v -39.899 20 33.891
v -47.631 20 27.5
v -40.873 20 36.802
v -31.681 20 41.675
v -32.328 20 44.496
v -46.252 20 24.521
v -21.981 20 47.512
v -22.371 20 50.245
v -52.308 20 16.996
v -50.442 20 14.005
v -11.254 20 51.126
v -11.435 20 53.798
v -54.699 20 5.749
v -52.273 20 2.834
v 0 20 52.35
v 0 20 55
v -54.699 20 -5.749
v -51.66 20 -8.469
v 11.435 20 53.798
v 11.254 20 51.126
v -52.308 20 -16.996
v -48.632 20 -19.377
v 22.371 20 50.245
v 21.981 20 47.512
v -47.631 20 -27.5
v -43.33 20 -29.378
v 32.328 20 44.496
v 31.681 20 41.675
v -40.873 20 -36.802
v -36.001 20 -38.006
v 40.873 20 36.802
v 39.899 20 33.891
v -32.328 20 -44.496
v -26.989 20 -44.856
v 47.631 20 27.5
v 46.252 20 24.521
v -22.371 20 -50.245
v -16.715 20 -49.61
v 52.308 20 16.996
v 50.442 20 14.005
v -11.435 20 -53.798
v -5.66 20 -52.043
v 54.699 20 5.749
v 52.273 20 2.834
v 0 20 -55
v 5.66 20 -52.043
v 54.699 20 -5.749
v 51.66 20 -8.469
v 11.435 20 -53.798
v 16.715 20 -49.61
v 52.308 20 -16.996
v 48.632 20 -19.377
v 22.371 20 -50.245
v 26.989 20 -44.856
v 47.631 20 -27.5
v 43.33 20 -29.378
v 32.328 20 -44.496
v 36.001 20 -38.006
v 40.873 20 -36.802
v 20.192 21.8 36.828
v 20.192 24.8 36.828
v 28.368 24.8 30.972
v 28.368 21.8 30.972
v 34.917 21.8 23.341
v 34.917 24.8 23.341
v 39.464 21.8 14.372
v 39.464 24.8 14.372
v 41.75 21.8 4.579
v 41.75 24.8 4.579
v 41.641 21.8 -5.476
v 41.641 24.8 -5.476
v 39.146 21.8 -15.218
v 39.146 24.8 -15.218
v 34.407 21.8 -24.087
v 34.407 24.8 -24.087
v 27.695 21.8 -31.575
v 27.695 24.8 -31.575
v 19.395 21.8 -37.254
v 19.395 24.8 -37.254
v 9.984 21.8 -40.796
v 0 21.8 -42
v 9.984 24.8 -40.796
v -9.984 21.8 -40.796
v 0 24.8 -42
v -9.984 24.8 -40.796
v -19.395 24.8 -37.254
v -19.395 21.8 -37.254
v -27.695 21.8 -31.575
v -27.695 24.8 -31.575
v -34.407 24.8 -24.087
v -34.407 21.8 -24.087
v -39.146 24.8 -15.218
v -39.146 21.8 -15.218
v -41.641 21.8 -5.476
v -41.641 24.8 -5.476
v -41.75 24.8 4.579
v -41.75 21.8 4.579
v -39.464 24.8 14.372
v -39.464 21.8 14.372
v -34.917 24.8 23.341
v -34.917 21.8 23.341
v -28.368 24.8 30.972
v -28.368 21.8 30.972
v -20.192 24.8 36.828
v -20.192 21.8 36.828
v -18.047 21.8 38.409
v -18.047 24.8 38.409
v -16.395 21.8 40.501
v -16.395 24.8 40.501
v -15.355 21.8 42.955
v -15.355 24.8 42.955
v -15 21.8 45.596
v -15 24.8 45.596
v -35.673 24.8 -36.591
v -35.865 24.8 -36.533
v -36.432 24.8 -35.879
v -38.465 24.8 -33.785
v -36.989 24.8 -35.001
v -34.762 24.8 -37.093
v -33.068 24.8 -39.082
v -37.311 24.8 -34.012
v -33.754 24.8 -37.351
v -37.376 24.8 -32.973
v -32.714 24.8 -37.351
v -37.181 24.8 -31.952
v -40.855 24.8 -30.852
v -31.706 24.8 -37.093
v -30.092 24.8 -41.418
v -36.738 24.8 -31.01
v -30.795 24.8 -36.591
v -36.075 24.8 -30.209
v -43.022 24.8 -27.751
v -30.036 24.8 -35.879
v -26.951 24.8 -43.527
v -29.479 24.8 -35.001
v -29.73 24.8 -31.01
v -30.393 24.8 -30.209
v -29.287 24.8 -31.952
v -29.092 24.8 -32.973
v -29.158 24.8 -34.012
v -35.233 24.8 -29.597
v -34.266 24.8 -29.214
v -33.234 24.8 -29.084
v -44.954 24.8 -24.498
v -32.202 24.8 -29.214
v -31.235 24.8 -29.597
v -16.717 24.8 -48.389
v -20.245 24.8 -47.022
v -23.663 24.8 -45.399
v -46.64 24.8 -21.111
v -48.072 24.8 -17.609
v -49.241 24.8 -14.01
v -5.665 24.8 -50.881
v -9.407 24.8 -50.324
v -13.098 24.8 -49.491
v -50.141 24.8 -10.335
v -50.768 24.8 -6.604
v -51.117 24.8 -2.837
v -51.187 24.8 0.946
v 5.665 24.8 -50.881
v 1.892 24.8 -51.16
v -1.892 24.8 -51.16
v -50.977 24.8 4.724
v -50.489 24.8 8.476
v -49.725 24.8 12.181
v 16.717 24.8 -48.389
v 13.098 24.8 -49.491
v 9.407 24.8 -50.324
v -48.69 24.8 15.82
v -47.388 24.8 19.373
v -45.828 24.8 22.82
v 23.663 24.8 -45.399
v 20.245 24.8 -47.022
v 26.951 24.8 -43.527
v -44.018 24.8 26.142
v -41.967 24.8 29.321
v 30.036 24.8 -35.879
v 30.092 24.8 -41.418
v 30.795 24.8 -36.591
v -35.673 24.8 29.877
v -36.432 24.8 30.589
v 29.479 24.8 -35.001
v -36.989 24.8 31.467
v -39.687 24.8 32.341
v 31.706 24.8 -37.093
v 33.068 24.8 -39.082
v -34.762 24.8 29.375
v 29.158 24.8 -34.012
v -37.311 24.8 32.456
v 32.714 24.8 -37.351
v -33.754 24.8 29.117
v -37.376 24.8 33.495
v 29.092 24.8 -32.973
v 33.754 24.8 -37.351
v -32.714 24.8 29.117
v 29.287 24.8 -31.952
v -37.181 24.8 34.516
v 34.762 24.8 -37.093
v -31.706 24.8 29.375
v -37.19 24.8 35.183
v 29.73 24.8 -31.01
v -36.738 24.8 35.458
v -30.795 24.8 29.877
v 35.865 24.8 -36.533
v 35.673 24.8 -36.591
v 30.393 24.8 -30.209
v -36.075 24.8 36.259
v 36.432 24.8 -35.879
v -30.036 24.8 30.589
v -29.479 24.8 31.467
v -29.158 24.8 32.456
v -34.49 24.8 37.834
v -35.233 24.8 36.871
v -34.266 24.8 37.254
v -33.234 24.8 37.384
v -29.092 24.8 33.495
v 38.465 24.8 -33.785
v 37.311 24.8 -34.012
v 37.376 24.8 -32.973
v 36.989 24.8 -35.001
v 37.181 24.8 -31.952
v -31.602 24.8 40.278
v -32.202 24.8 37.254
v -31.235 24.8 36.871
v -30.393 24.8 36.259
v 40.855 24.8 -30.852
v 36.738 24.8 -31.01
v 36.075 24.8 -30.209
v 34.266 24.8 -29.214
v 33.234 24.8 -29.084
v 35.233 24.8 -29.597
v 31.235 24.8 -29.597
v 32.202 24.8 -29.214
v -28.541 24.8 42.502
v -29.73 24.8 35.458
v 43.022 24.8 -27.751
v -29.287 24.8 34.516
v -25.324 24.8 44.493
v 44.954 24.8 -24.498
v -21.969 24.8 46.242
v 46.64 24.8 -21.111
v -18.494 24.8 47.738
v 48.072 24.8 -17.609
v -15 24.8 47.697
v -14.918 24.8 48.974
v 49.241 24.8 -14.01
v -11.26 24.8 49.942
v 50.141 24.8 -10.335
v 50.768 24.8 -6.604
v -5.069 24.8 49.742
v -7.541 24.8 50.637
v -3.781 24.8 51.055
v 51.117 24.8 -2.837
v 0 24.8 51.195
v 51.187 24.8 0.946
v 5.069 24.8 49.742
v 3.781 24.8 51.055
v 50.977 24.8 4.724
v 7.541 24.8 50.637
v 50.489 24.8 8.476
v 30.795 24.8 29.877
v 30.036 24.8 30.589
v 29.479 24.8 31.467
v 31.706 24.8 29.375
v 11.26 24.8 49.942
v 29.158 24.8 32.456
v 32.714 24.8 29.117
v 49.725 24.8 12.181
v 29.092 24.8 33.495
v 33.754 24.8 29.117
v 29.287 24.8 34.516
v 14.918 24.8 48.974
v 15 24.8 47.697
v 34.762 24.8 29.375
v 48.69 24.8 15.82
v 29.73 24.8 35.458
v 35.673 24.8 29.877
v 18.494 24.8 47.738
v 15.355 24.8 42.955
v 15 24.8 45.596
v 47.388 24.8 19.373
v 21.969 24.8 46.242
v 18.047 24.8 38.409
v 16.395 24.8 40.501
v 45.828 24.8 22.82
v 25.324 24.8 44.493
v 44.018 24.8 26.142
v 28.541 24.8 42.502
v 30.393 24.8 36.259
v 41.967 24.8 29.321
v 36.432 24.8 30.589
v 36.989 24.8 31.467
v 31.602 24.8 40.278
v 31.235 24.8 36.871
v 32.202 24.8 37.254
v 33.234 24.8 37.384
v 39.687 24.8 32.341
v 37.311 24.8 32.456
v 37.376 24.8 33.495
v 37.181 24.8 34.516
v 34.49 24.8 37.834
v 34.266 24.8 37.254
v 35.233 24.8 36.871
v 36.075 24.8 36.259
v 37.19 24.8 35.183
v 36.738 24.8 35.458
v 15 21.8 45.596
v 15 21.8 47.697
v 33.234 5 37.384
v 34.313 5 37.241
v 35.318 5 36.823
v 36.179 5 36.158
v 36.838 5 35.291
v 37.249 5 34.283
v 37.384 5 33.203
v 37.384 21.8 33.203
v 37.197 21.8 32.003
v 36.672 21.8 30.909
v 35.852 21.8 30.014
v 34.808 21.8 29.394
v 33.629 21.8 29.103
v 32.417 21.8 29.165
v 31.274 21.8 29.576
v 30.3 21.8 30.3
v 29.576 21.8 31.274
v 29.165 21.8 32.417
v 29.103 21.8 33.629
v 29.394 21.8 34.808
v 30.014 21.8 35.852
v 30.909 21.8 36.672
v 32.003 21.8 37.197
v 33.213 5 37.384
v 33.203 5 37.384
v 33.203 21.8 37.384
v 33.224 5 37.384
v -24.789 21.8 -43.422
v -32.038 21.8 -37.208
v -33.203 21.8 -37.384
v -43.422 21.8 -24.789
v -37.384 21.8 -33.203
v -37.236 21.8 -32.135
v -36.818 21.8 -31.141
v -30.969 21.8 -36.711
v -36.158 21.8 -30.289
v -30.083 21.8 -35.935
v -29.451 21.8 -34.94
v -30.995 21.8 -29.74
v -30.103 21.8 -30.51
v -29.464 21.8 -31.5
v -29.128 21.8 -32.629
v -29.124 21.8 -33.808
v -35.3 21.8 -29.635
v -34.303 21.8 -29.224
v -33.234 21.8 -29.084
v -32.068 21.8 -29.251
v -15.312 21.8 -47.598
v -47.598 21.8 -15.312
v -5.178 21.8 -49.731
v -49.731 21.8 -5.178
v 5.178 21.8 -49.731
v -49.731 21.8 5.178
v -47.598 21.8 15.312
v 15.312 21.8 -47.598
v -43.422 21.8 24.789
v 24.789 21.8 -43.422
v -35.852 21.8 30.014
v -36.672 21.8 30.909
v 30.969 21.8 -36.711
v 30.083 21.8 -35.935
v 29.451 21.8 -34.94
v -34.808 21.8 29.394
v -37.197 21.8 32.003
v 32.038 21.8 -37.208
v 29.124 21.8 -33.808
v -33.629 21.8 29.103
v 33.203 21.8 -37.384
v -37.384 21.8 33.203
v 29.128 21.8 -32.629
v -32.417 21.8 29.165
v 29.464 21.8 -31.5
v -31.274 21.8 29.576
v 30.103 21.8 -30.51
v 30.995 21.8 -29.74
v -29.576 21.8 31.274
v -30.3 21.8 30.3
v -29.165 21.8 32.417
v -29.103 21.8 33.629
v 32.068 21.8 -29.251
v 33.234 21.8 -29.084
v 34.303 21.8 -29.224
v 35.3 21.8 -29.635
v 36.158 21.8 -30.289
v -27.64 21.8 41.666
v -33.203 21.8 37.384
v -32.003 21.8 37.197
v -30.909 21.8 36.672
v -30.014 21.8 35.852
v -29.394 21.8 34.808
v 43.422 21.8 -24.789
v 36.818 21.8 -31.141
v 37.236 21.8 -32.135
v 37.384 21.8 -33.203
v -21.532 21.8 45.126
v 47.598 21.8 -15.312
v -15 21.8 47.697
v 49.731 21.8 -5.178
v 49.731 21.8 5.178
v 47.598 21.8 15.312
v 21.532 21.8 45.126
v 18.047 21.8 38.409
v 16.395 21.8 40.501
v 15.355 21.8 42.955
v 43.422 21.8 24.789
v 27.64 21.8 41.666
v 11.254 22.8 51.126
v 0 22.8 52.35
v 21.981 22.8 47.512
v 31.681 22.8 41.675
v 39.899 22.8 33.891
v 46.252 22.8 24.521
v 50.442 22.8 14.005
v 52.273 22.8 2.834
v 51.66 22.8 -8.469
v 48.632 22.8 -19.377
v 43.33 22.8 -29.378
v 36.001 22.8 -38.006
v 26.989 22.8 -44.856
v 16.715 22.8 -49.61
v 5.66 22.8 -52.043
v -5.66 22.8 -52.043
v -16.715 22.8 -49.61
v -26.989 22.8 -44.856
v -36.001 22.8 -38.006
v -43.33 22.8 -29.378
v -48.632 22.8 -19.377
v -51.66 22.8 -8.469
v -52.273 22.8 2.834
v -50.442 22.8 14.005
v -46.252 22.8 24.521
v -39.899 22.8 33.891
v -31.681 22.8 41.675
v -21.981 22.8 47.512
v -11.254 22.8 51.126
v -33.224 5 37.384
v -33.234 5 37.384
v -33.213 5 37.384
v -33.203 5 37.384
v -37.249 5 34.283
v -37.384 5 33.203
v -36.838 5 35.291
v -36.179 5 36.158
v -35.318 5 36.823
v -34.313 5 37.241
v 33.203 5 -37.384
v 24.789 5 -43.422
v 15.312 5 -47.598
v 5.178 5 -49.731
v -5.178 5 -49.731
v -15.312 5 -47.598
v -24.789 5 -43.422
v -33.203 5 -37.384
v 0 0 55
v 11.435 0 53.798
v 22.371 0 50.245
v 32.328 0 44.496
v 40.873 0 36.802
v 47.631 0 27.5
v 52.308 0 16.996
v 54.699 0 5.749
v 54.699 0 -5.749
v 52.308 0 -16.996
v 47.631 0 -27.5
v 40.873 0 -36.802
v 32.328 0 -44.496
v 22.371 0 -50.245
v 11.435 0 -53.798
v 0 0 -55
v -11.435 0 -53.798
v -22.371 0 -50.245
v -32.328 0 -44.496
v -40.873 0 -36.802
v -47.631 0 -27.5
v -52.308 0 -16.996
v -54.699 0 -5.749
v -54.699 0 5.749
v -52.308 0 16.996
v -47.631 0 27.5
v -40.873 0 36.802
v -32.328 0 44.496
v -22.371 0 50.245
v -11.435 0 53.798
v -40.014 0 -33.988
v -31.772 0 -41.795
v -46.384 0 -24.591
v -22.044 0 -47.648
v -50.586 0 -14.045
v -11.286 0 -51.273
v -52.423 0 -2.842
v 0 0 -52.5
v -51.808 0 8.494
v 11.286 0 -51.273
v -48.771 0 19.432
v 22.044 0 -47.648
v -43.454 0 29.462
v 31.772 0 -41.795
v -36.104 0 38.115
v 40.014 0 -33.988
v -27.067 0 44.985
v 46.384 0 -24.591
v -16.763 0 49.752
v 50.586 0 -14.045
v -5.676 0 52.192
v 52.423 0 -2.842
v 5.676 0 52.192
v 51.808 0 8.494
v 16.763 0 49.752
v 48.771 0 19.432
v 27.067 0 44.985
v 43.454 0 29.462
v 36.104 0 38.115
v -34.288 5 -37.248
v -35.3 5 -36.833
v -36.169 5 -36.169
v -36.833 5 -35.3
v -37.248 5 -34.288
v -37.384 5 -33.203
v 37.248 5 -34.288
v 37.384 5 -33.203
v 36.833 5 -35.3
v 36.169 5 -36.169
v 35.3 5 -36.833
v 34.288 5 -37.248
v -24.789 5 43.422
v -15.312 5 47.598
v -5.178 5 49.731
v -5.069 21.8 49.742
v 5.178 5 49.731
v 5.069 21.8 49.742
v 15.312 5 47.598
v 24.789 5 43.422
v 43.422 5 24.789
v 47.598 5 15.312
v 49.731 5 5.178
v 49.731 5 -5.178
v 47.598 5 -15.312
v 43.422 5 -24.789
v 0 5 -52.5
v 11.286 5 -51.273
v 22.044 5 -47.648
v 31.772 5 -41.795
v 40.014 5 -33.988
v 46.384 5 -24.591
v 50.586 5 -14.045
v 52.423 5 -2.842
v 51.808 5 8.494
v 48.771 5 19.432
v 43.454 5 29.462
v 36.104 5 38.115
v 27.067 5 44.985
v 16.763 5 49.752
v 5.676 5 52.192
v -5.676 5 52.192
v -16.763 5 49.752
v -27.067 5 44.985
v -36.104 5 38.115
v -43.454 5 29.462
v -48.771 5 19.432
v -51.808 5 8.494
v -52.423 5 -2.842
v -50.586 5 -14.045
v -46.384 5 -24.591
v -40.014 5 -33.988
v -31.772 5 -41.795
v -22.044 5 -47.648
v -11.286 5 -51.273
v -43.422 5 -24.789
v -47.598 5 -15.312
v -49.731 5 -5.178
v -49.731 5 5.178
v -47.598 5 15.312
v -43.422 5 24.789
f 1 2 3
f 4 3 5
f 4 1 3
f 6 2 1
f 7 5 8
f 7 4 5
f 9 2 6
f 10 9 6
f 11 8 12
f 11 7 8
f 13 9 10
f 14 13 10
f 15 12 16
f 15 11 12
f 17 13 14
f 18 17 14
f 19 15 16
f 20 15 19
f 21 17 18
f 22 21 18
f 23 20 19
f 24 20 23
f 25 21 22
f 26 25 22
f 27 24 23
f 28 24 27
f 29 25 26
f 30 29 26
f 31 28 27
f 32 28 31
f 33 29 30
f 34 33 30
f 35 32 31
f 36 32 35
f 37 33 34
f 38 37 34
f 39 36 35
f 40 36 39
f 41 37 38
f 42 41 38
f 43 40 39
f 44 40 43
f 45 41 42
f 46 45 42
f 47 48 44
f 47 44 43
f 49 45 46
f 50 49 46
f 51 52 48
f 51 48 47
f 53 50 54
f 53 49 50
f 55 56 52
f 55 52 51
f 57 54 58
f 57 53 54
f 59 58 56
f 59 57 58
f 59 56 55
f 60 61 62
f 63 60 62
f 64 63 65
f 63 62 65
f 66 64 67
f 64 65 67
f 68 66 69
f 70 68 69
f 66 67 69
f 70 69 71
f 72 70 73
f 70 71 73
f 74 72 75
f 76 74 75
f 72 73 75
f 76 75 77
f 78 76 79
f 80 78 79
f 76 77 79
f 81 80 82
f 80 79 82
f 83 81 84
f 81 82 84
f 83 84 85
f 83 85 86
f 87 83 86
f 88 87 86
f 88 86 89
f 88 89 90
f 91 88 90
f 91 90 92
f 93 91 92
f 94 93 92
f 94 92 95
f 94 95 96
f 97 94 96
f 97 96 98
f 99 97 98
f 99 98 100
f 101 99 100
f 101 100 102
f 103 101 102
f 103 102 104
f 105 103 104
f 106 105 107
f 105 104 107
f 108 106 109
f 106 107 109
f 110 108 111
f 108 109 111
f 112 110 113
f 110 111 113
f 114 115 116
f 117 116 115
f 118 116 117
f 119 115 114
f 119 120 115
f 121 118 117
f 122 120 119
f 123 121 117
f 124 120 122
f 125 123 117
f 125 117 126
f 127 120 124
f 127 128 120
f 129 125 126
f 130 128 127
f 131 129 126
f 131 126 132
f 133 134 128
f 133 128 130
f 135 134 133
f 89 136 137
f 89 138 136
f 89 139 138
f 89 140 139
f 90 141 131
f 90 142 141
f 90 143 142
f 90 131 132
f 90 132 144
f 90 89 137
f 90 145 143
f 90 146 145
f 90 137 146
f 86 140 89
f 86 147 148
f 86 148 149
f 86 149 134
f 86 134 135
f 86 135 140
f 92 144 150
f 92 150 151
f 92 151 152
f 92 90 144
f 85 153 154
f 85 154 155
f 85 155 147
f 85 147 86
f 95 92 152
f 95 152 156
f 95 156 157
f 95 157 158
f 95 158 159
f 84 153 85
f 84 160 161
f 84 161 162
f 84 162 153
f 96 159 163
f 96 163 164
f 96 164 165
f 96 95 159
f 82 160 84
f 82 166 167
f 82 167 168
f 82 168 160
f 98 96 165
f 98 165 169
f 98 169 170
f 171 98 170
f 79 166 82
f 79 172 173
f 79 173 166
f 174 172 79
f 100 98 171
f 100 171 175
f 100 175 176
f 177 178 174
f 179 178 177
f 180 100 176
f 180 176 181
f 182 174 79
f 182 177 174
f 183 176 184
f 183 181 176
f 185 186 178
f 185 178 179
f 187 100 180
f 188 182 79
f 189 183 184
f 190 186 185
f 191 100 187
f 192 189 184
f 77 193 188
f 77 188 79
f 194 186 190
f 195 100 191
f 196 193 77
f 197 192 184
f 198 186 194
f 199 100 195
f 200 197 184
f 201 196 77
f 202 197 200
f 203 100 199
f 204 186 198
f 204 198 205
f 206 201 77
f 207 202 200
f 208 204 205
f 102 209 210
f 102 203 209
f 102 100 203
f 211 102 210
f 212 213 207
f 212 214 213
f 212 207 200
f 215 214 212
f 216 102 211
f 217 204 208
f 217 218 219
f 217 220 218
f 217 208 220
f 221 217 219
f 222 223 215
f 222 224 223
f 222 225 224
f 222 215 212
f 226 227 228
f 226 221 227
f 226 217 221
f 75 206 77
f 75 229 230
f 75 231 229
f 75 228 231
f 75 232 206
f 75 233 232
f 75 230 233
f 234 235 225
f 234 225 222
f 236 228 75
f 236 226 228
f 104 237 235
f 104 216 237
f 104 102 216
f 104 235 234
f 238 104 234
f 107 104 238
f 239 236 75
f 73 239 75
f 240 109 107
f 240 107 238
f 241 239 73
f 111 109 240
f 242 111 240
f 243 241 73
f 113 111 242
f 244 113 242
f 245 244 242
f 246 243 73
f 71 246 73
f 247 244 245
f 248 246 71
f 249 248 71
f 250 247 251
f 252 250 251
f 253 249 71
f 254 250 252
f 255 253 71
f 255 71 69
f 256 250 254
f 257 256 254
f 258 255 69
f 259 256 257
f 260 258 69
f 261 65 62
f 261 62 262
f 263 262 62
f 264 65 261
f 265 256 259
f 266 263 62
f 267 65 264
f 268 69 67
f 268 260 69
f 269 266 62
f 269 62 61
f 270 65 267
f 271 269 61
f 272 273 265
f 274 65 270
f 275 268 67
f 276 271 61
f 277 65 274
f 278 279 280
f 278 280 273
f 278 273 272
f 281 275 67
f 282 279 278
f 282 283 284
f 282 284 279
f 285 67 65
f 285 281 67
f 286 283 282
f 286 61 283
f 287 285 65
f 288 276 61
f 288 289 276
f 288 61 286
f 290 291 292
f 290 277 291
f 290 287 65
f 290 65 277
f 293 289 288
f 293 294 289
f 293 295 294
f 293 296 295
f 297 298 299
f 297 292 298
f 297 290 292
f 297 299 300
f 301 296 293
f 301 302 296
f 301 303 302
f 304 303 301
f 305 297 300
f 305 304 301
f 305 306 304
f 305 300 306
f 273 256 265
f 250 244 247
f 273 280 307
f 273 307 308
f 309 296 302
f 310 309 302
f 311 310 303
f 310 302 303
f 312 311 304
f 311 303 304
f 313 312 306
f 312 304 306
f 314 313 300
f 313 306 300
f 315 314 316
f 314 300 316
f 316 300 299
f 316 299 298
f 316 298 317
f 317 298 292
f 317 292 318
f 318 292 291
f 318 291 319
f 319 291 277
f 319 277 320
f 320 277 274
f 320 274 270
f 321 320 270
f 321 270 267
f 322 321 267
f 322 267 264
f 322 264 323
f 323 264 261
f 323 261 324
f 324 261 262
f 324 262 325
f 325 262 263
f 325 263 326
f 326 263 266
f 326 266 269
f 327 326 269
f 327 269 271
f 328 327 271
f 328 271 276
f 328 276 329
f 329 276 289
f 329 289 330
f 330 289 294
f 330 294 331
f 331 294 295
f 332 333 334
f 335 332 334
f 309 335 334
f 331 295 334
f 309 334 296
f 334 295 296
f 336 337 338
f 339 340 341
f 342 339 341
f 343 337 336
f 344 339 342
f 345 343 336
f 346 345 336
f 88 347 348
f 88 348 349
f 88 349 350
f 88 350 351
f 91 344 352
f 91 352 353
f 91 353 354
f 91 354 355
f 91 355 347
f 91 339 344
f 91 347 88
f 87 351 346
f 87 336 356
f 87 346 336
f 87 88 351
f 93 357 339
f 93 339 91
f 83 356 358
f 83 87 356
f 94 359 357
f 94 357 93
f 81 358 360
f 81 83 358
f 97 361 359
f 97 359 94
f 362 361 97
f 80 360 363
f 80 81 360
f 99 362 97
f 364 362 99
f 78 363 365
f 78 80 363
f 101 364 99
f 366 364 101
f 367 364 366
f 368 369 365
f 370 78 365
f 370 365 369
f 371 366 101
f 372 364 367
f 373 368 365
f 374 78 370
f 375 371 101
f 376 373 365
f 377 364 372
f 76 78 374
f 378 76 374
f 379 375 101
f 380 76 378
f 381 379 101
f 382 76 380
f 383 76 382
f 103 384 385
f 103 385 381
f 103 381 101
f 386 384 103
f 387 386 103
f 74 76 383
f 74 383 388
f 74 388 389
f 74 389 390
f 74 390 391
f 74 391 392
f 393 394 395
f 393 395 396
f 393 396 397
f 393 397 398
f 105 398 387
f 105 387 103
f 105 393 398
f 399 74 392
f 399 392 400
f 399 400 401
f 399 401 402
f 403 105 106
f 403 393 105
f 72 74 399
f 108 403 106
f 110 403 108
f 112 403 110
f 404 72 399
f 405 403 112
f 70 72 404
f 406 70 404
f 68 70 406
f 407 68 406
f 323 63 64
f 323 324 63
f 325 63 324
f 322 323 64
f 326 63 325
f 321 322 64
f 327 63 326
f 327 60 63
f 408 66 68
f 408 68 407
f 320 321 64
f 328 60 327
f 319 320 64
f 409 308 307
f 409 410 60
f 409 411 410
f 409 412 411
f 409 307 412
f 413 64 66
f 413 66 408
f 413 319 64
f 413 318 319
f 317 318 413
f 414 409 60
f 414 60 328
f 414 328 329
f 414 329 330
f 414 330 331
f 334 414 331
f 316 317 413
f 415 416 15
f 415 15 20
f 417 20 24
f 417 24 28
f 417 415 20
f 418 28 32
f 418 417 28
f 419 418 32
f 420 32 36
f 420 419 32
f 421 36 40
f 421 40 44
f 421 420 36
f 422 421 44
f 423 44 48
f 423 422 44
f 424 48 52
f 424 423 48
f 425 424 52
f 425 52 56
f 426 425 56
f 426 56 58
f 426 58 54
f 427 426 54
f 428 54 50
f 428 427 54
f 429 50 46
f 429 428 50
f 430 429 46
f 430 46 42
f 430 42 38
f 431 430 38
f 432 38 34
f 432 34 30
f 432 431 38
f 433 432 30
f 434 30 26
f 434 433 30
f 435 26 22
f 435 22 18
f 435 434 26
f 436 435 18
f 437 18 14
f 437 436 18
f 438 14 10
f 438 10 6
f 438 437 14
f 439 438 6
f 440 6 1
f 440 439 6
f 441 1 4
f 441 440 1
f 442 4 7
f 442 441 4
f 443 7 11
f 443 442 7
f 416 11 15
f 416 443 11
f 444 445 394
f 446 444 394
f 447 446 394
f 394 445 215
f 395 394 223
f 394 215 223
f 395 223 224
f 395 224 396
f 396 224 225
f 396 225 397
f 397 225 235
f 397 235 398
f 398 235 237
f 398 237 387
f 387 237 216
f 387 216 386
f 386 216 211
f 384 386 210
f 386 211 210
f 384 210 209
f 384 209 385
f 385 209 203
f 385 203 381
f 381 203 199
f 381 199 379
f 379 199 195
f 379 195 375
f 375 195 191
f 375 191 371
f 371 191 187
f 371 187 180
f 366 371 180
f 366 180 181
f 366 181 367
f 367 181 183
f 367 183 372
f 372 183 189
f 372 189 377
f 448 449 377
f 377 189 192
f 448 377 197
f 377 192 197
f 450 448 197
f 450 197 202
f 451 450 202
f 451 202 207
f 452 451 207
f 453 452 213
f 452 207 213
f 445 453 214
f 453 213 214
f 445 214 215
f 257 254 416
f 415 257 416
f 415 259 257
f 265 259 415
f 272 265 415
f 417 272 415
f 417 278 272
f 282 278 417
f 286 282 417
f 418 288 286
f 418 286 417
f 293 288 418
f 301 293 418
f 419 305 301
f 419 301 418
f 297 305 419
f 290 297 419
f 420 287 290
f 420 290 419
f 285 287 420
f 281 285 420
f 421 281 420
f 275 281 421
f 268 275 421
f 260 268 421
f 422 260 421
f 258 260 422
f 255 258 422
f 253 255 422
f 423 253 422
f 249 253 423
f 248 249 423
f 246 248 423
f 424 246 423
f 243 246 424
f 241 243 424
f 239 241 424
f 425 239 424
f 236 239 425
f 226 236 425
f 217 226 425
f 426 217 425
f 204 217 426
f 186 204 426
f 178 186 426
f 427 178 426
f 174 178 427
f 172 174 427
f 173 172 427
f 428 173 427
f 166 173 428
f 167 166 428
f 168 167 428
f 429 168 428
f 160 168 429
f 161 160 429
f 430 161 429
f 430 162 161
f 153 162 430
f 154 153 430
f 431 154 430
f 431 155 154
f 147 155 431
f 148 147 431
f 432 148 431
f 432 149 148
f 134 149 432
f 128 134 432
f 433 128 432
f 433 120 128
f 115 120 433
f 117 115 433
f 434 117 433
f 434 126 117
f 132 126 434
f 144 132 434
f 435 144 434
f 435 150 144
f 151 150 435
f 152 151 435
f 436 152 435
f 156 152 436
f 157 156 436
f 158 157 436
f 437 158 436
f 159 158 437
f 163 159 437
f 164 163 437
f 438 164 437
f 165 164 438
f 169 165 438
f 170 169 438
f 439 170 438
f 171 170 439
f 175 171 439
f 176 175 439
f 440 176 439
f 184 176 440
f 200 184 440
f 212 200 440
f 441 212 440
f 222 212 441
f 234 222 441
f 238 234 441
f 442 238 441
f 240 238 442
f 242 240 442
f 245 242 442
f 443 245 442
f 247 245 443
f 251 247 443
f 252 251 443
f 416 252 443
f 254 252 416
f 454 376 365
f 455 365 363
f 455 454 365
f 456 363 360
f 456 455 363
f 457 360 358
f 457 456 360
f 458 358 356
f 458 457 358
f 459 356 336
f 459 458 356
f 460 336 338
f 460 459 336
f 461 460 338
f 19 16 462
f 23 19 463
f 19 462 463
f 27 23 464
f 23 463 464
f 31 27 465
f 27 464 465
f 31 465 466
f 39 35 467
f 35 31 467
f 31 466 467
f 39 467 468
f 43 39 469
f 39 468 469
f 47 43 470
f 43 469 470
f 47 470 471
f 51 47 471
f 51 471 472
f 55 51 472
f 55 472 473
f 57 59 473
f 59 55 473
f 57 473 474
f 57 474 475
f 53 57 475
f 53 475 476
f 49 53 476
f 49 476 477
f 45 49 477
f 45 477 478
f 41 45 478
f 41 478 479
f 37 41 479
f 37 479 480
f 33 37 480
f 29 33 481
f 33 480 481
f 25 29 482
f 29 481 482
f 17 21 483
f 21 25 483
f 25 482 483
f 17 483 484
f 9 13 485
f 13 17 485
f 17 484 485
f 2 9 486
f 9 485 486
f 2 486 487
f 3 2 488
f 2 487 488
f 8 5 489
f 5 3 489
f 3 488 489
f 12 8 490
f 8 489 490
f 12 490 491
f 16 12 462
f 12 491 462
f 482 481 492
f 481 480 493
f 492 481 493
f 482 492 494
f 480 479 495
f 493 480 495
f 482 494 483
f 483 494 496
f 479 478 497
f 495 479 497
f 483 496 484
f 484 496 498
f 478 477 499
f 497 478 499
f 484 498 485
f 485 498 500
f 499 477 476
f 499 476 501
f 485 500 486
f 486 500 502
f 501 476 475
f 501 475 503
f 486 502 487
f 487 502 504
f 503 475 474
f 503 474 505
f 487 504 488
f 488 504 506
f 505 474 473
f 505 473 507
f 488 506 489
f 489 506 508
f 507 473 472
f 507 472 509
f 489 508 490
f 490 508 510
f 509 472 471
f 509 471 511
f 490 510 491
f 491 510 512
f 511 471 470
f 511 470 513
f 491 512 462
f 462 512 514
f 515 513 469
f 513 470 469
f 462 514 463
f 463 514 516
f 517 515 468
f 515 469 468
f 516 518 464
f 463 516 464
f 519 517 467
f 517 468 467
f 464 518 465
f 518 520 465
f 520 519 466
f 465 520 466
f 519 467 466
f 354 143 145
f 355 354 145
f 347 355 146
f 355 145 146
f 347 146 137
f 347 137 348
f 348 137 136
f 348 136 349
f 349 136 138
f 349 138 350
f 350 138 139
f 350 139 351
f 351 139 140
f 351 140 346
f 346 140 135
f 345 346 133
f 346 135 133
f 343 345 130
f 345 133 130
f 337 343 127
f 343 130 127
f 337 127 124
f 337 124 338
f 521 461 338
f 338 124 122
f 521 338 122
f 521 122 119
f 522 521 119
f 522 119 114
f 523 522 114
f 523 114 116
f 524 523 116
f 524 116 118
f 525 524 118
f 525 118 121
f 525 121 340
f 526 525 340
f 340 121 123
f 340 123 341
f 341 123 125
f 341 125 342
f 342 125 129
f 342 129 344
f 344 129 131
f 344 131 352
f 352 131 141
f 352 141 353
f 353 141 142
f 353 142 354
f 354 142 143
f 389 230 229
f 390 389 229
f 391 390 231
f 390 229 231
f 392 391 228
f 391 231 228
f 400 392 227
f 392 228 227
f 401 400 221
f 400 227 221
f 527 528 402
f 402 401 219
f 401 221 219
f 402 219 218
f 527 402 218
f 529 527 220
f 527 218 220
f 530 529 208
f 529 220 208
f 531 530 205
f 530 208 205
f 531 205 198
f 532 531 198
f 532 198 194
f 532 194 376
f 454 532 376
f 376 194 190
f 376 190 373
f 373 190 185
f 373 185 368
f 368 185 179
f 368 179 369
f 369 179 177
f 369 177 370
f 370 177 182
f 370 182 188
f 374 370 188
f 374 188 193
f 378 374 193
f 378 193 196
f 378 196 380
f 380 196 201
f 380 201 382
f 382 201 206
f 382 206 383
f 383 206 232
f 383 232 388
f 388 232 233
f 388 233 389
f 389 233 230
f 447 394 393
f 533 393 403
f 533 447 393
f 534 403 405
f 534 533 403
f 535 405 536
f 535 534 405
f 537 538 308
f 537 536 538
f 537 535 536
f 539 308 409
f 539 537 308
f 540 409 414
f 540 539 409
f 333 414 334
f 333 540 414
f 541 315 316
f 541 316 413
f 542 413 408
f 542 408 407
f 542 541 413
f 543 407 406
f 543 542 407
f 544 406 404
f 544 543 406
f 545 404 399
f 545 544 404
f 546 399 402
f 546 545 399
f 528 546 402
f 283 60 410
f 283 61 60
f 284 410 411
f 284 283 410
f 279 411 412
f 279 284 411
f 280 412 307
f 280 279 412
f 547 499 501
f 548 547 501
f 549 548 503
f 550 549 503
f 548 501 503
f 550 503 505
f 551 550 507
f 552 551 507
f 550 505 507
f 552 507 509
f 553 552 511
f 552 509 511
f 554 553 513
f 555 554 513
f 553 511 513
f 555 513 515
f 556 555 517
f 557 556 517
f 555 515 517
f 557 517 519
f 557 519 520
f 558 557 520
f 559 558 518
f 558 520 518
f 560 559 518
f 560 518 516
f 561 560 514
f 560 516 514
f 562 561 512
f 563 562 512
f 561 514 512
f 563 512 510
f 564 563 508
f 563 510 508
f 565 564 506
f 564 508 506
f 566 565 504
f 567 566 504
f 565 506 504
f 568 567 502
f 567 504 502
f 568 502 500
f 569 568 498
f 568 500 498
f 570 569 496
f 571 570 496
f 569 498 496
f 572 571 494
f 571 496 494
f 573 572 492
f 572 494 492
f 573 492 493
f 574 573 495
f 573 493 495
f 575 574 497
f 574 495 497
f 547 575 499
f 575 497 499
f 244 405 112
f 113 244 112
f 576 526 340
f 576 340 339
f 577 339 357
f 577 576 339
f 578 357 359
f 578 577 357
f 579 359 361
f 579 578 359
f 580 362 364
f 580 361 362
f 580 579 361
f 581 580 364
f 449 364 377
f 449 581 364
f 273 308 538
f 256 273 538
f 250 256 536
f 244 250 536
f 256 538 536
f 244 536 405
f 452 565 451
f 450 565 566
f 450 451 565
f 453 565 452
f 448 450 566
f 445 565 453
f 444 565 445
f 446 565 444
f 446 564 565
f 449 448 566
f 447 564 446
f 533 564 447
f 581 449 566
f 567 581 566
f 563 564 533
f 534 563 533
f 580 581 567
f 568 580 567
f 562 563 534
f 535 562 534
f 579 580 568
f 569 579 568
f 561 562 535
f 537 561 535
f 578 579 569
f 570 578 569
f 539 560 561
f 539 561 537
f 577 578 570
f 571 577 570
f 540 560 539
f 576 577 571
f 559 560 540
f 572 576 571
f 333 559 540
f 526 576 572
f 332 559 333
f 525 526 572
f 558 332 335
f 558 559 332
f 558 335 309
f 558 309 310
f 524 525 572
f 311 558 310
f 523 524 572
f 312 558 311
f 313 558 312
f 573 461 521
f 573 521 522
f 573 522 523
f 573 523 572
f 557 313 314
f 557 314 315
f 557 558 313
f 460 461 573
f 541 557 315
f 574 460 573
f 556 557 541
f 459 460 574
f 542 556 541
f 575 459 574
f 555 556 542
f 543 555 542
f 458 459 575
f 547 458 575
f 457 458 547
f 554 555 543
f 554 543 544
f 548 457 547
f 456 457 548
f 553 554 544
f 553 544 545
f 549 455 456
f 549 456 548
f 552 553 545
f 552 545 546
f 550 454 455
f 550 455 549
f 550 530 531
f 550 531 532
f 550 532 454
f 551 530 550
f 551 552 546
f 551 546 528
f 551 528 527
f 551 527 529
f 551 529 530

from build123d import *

# Parameters (mm, degrees)
SKETCH1_R           = 55
BOSS_EXTRUDE1_DEPTH = 24.8
SHELL1_T            = -5
SKETCH2_R           = 35
CUT_EXTRUDE1_DEPTH  = 6
SKETCH3_R           = 42
CUT_EXTRUDE2_DEPTH  = 25.8
SKETCH4_R           = 4.15
CUT_EXTRUDE3_DEPTH  = 25.8
SKETCH6_R           = 50
CUT_EXTRUDE4_DEPTH  = 2
CUT_EXTRUDE5_DEPTH  = 4
FILLET1_R           = 10
SKETCH8_OUTSIDE_W   = 143.506
SKETCH8_OUTSIDE_H   = 143.506
SKETCH8_OUTSIDE_R   = 52.35
CUT_EXTRUDE6_DEPTH  = 4.8
CHAMFER1_SIZE       = 2
CHAMFER1_SIZE2      = 1.154700538
SKETCH9_R           = 52.5
CUT_EXTRUDE7_DEPTH  = 5


with BuildPart() as part:
    # Sketch1 → Boss-Extrude1 (new body)
    with BuildSketch(Plane(origin=(0, 0, 0), x_dir=(1, 0, 0), z_dir=(0, 1, 0))):
        with Locations(Location((0, 0, 0), (0, 0, 270))):  # turned: the seam where the file's is
            Circle(SKETCH1_R)
    extrude(amount=BOSS_EXTRUDE1_DEPTH)

    # Shell1
    shell1_openings = [part.faces().sort_by_distance(p)[0] for p in [
        (0, 0, 0),
    ]]
    offset(amount=SHELL1_T, openings=shell1_openings, kind=Kind.INTERSECTION)

    # Sketch2 → Cut-Extrude1 (cut, through all)
    with BuildSketch(Plane.XZ.offset(-19.8)):
        with Locations(Location((0, 0, 0), (0, 0, 270))):  # turned: the seam where the file's is
            Circle(SKETCH2_R)
    extrude(amount=-CUT_EXTRUDE1_DEPTH, mode=Mode.SUBTRACT)

    # Sketch3 → Cut-Extrude2 (cut, through all)
    with BuildSketch(Plane(origin=(0, 24.8, 0), x_dir=(1, 0, 0), z_dir=(0, 1, 0))):
        with Locations(Location((0, 0, 0), (0, 0, 270))):  # turned: the seam where the file's is
            Circle(SKETCH3_R)
    extrude(amount=-CUT_EXTRUDE2_DEPTH, mode=Mode.SUBTRACT)

    # Sketch4 → Cut-Extrude3 (cut, through all)
    with BuildSketch(Plane(origin=(0, 24.8, 0), x_dir=(1, 0, 0), z_dir=(0, 1, 0))):
        with Locations(Location((-33.234018716, -33.234018716, 0), (0, 0, 270))):  # turned: the seam where the file's is
            Circle(SKETCH4_R)
        with Locations(Location((-33.234018716, 33.234018716, 0), (0, 0, 270))):  # turned: the seam where the file's is
            Circle(SKETCH4_R)
        with Locations(Location((33.234018716, 33.234018716, 0), (0, 0, 270))):  # turned: the seam where the file's is
            Circle(SKETCH4_R)
        with Locations(Location((33.234018716, -33.234018716, 0), (0, 0, 270))):  # turned: the seam where the file's is
            Circle(SKETCH4_R)
    extrude(amount=-CUT_EXTRUDE3_DEPTH, mode=Mode.SUBTRACT)

    # Sketch6 → Cut-Extrude4 (cut)
    with BuildSketch(Plane.XZ.offset(-19.8)):
        Circle(SKETCH6_R)
    extrude(amount=-CUT_EXTRUDE4_DEPTH, mode=Mode.SUBTRACT)

    # Sketch7 → Cut-Extrude5 (cut, through all)
    with BuildSketch(Plane.XZ.offset(-21.8)):
        with BuildLine():
            Line((15, 33.234018716), (15, 47.696960071))
            ThreePointArc((15, 47.696960071), (0, 50), (-15, 47.696960071))
            Line((-15, 47.696960071), (-15, 33.234018716))
            Line((-15, 33.234018716), (15, 33.234018716))
        make_face()
    extrude(amount=-CUT_EXTRUDE5_DEPTH, mode=Mode.SUBTRACT)

    # Fillet1
    fillet1_edges = [part.edges().sort_by_distance(p)[0] for p in [
        (-15, 23.3, 39.230090492),
        (15, 23.3, 39.230090492),
    ]]
    fillet(fillet1_edges, radius=FILLET1_R)

    # Sketch8 outside → Cut-Extrude6 (cut)
    with BuildSketch(Plane(origin=(0, 24.8, 0), x_dir=(1, 0, 0), z_dir=(0, 1, 0))):
        Rectangle(SKETCH8_OUTSIDE_W, SKETCH8_OUTSIDE_H)
        with Locations(Location((0, 0, 0), (0, 0, 270))):  # turned: the seam where the file's is
            Circle(SKETCH8_OUTSIDE_R, mode=Mode.SUBTRACT)
    extrude(amount=-CUT_EXTRUDE6_DEPTH, mode=Mode.SUBTRACT)

    # Chamfer1
    chamfer1_edges = [part.edges().sort_by_distance(p)[0] for p in [
        (0, 24.8, -52.35),
    ]]
    chamfer1_side = [part.faces().sort_by_distance(p)[0] for p in [
        (0, 22.4, -52.35),
    ]]
    chamfer(chamfer1_edges, length=CHAMFER1_SIZE, length2=CHAMFER1_SIZE2, reference=chamfer1_side[0])

    # Sketch9 → Cut-Extrude7 (cut)
    with BuildSketch(Plane.XZ):
        with Locations(Location((0, 0, 0), (0, 0, 270))):  # turned: the seam where the file's is
            Circle(SKETCH9_R)
    extrude(amount=-CUT_EXTRUDE7_DEPTH, mode=Mode.SUBTRACT)


solid = part.part
